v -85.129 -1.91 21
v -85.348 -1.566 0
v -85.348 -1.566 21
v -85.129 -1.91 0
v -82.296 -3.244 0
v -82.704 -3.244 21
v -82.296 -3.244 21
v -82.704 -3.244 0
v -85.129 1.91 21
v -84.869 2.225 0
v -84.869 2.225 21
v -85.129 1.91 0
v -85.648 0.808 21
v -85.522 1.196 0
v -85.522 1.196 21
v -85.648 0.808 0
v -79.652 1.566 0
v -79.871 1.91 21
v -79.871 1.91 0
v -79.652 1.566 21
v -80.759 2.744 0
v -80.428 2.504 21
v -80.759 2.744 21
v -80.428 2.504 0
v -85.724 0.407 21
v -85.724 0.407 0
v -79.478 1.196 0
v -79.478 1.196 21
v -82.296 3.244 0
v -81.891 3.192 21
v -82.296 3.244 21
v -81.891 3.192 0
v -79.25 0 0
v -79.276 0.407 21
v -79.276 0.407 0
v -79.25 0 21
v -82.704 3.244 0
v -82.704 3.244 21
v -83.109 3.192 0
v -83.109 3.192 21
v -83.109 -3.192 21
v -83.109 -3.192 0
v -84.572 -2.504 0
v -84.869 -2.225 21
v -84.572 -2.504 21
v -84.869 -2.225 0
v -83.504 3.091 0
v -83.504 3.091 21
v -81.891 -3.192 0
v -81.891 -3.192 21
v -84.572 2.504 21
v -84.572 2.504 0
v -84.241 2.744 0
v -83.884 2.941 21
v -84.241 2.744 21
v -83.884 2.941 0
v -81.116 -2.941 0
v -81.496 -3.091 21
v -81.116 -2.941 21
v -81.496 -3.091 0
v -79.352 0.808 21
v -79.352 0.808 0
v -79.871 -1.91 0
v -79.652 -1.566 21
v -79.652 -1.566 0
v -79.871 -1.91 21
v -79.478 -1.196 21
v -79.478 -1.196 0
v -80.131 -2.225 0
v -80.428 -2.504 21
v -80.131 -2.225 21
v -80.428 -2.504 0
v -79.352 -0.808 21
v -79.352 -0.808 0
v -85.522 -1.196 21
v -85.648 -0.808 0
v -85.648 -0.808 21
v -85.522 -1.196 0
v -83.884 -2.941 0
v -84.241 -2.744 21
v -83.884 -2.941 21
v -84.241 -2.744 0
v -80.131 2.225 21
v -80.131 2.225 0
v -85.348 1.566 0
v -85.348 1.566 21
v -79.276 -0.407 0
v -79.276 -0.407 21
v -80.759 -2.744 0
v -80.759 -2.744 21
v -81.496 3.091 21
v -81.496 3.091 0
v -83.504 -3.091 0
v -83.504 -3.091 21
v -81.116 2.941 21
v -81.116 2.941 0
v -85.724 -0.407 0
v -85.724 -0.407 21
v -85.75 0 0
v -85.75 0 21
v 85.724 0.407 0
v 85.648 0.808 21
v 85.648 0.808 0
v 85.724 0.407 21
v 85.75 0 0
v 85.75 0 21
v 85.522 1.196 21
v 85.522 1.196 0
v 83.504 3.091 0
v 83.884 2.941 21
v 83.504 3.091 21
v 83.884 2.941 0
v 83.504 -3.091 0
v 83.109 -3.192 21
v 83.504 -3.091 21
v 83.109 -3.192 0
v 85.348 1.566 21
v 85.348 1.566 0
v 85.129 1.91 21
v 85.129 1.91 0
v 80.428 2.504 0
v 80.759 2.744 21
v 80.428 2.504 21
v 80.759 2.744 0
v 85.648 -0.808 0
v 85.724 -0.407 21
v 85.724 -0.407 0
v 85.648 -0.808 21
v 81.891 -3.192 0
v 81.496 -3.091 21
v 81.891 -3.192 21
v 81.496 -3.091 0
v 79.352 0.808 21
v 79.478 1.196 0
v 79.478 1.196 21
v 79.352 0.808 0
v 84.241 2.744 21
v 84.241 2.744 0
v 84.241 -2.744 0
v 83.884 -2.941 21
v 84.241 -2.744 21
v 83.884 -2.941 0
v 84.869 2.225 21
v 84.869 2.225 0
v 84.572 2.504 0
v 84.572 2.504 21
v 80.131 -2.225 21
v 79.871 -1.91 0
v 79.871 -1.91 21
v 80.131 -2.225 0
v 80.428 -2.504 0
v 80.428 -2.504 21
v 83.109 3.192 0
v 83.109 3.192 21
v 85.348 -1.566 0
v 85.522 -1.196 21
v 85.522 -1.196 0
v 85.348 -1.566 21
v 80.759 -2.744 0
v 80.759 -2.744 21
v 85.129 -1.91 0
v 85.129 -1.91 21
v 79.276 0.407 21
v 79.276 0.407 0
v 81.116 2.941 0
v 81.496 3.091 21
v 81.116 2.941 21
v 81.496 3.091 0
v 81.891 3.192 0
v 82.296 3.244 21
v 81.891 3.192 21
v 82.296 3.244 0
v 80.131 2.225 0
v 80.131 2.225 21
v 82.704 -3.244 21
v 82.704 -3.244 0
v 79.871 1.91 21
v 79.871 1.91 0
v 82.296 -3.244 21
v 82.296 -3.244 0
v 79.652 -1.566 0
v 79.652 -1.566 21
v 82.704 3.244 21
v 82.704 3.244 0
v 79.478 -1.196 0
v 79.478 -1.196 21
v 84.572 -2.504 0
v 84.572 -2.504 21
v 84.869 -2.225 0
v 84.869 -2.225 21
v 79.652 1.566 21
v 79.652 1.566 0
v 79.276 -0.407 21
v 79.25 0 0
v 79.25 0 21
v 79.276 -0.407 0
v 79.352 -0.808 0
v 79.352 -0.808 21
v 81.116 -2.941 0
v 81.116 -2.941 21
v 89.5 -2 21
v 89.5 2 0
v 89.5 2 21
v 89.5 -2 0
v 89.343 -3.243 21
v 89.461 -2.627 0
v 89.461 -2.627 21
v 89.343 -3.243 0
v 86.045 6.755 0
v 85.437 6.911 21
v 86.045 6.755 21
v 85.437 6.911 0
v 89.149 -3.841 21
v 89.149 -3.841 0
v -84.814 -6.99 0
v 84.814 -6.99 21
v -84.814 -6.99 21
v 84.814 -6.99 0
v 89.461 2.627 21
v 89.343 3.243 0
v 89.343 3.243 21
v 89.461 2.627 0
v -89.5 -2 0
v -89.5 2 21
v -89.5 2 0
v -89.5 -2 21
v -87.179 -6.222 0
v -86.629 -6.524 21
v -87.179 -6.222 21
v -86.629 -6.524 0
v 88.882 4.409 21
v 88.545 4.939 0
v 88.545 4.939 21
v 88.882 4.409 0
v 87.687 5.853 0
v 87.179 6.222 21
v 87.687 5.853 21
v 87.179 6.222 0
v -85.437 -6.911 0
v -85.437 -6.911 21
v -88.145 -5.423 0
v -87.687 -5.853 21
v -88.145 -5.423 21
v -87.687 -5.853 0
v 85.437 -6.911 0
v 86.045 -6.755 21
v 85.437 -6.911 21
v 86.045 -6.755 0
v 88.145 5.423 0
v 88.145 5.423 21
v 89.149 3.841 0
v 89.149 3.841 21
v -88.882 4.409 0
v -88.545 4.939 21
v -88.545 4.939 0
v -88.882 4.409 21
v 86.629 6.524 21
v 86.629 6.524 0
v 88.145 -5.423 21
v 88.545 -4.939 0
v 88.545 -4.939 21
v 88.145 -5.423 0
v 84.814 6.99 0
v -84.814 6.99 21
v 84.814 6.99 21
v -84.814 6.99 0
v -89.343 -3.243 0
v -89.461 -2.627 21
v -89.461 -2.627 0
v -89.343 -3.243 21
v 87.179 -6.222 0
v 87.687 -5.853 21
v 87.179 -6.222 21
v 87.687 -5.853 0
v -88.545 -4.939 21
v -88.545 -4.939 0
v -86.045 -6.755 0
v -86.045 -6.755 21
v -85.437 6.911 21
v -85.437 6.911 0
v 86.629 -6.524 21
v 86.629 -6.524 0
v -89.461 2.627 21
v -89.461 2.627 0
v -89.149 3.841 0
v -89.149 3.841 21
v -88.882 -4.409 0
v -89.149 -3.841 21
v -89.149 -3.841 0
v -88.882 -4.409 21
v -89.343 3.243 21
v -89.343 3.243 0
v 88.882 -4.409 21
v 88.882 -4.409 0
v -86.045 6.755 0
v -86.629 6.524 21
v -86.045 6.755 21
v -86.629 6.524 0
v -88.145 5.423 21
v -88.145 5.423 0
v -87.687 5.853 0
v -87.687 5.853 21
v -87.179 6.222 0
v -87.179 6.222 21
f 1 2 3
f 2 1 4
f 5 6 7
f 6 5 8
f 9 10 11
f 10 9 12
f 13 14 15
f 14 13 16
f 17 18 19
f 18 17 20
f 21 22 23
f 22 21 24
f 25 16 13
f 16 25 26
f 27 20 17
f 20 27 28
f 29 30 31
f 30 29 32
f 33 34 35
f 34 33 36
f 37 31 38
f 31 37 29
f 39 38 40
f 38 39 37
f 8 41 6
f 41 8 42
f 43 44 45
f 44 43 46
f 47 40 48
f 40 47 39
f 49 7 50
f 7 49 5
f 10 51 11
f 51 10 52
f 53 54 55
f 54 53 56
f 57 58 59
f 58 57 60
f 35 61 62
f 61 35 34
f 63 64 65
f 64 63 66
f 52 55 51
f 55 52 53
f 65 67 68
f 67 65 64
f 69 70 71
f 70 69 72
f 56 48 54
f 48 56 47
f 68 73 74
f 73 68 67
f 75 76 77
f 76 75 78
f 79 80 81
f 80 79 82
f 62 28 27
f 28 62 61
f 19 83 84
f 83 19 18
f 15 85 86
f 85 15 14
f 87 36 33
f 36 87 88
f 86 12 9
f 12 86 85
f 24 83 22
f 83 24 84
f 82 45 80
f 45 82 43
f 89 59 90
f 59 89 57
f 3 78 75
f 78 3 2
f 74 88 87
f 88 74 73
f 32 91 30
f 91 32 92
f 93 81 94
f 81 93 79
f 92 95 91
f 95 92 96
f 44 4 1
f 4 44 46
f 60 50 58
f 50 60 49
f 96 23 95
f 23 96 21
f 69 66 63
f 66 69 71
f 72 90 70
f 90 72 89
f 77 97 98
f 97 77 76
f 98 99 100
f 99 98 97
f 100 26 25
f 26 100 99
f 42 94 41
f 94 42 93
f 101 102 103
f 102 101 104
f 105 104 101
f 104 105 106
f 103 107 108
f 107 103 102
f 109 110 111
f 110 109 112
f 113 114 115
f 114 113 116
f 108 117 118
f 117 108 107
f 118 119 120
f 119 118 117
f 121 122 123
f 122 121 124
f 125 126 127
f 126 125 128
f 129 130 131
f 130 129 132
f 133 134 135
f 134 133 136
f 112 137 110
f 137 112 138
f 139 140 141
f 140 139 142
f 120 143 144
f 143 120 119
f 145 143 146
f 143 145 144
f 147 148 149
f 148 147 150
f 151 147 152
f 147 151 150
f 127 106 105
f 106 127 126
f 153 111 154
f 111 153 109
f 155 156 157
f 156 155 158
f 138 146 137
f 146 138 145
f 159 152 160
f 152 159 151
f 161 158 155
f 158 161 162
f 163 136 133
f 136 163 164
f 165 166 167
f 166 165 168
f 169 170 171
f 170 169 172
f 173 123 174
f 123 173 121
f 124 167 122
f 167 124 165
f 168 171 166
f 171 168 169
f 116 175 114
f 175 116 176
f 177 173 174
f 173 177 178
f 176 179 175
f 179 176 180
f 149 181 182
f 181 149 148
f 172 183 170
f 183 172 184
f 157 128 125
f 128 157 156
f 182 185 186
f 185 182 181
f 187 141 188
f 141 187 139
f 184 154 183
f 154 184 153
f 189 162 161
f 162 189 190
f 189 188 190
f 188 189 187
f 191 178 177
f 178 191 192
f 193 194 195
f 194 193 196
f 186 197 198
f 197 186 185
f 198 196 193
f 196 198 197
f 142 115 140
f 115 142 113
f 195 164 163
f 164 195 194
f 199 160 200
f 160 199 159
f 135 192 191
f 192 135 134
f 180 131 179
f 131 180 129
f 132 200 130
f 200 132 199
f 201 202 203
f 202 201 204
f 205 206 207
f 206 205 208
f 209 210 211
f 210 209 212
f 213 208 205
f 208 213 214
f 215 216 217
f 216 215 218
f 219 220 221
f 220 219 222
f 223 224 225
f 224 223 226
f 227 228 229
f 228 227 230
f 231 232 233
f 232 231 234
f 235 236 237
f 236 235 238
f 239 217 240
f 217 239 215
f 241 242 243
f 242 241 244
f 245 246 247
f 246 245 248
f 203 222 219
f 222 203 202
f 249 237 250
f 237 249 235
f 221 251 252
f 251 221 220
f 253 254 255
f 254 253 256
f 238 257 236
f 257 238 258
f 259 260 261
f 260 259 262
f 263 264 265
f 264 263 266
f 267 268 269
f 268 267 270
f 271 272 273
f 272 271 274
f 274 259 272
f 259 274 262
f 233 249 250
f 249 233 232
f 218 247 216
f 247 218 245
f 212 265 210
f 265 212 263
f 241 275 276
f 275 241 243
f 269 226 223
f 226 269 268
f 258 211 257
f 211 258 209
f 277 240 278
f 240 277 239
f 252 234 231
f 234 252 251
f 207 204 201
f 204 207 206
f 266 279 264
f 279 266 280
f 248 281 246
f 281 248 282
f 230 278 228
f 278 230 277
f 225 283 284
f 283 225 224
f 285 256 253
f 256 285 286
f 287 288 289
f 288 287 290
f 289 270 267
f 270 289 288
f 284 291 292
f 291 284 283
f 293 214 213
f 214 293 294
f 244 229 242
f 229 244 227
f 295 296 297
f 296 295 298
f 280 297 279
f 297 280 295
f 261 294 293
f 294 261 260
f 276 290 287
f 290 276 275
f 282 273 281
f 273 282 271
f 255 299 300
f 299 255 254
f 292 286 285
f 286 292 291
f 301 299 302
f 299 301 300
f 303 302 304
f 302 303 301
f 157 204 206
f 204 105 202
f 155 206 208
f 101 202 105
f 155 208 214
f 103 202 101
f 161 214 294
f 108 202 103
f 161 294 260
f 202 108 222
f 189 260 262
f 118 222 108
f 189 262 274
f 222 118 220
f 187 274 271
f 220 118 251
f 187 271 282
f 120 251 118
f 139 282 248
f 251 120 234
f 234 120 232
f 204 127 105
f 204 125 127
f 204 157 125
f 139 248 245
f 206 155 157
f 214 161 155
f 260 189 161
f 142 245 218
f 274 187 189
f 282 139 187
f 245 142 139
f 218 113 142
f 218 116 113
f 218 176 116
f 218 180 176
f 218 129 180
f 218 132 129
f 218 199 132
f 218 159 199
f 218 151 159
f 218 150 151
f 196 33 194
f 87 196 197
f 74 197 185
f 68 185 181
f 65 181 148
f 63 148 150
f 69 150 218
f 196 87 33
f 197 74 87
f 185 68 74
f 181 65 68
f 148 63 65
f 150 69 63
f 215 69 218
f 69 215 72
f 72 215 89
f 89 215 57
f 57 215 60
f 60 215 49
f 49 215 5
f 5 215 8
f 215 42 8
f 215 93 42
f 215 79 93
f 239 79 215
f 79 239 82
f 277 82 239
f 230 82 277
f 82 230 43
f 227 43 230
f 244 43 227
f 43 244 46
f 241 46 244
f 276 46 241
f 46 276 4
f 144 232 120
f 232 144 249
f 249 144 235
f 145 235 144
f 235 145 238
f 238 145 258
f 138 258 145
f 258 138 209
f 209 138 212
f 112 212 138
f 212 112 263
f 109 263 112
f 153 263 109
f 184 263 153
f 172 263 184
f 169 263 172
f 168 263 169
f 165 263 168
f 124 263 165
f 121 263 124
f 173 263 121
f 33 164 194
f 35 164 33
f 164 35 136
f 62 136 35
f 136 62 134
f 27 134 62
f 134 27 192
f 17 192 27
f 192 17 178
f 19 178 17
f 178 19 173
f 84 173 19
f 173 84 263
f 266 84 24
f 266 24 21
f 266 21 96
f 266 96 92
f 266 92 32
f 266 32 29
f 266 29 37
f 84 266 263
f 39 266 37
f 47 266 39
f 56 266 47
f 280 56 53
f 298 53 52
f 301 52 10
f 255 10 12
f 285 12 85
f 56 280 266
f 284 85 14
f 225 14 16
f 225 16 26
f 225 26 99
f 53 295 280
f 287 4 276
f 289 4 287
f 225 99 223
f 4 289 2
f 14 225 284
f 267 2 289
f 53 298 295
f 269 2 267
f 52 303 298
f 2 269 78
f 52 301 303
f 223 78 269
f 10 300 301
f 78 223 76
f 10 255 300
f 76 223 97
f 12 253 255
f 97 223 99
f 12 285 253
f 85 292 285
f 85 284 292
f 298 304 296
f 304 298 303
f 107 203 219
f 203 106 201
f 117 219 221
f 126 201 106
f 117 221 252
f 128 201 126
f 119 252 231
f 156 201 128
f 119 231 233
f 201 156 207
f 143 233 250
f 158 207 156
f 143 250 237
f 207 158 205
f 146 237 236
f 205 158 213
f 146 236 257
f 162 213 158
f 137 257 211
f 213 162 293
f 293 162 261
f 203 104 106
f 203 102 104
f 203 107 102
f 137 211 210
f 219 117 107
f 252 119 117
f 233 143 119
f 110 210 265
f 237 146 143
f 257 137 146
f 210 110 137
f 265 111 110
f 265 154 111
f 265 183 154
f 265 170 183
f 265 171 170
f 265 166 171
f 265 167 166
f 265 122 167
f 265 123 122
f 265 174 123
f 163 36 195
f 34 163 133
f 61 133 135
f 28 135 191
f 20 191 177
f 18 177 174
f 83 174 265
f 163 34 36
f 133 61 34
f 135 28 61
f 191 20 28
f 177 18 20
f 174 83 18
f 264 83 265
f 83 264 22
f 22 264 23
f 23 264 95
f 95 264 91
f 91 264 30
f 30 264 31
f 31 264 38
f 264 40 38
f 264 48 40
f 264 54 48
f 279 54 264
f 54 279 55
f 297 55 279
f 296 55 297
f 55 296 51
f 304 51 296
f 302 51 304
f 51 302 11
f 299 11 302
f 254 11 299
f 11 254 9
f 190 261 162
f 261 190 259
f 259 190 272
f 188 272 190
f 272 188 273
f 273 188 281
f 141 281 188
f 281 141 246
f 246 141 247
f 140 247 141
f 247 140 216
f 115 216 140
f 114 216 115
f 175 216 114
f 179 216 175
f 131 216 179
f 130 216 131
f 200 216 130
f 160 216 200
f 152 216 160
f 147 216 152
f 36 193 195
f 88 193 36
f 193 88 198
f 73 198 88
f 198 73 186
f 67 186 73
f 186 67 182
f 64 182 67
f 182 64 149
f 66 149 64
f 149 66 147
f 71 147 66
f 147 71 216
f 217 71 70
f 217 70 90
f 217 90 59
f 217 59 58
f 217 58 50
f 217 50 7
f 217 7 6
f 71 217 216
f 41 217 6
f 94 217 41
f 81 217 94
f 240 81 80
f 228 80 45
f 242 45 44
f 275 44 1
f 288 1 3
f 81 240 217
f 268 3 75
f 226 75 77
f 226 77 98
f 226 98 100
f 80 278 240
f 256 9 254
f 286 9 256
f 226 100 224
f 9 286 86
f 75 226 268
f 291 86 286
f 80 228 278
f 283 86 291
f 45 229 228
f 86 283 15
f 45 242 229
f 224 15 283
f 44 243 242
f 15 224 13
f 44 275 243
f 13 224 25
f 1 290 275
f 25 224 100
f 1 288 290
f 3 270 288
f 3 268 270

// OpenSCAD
$fn = 50;


difference() {
	union() {
		hull() {
			translate(v = [-84.5000000000, 2.0000000000, 0]) {
				cylinder(h = 21, r = 5);
			}
			translate(v = [84.5000000000, 2.0000000000, 0]) {
				cylinder(h = 21, r = 5);
			}
			translate(v = [-84.5000000000, -2.0000000000, 0]) {
				cylinder(h = 21, r = 5);
			}
			translate(v = [84.5000000000, -2.0000000000, 0]) {
				cylinder(h = 21, r = 5);
			}
		}
	}
	union() {
		translate(v = [-82.5000000000, 0.0000000000, -100.0000000000]) {
			cylinder(h = 200, r = 3.2500000000);
		}
		translate(v = [-82.5000000000, 0.0000000000, -100.0000000000]) {
			cylinder(h = 200, r = 3.2500000000);
		}
		translate(v = [82.5000000000, 0.0000000000, -100.0000000000]) {
			cylinder(h = 200, r = 3.2500000000);
		}
		translate(v = [82.5000000000, 0.0000000000, -100.0000000000]) {
			cylinder(h = 200, r = 3.2500000000);
		}
	}
}
